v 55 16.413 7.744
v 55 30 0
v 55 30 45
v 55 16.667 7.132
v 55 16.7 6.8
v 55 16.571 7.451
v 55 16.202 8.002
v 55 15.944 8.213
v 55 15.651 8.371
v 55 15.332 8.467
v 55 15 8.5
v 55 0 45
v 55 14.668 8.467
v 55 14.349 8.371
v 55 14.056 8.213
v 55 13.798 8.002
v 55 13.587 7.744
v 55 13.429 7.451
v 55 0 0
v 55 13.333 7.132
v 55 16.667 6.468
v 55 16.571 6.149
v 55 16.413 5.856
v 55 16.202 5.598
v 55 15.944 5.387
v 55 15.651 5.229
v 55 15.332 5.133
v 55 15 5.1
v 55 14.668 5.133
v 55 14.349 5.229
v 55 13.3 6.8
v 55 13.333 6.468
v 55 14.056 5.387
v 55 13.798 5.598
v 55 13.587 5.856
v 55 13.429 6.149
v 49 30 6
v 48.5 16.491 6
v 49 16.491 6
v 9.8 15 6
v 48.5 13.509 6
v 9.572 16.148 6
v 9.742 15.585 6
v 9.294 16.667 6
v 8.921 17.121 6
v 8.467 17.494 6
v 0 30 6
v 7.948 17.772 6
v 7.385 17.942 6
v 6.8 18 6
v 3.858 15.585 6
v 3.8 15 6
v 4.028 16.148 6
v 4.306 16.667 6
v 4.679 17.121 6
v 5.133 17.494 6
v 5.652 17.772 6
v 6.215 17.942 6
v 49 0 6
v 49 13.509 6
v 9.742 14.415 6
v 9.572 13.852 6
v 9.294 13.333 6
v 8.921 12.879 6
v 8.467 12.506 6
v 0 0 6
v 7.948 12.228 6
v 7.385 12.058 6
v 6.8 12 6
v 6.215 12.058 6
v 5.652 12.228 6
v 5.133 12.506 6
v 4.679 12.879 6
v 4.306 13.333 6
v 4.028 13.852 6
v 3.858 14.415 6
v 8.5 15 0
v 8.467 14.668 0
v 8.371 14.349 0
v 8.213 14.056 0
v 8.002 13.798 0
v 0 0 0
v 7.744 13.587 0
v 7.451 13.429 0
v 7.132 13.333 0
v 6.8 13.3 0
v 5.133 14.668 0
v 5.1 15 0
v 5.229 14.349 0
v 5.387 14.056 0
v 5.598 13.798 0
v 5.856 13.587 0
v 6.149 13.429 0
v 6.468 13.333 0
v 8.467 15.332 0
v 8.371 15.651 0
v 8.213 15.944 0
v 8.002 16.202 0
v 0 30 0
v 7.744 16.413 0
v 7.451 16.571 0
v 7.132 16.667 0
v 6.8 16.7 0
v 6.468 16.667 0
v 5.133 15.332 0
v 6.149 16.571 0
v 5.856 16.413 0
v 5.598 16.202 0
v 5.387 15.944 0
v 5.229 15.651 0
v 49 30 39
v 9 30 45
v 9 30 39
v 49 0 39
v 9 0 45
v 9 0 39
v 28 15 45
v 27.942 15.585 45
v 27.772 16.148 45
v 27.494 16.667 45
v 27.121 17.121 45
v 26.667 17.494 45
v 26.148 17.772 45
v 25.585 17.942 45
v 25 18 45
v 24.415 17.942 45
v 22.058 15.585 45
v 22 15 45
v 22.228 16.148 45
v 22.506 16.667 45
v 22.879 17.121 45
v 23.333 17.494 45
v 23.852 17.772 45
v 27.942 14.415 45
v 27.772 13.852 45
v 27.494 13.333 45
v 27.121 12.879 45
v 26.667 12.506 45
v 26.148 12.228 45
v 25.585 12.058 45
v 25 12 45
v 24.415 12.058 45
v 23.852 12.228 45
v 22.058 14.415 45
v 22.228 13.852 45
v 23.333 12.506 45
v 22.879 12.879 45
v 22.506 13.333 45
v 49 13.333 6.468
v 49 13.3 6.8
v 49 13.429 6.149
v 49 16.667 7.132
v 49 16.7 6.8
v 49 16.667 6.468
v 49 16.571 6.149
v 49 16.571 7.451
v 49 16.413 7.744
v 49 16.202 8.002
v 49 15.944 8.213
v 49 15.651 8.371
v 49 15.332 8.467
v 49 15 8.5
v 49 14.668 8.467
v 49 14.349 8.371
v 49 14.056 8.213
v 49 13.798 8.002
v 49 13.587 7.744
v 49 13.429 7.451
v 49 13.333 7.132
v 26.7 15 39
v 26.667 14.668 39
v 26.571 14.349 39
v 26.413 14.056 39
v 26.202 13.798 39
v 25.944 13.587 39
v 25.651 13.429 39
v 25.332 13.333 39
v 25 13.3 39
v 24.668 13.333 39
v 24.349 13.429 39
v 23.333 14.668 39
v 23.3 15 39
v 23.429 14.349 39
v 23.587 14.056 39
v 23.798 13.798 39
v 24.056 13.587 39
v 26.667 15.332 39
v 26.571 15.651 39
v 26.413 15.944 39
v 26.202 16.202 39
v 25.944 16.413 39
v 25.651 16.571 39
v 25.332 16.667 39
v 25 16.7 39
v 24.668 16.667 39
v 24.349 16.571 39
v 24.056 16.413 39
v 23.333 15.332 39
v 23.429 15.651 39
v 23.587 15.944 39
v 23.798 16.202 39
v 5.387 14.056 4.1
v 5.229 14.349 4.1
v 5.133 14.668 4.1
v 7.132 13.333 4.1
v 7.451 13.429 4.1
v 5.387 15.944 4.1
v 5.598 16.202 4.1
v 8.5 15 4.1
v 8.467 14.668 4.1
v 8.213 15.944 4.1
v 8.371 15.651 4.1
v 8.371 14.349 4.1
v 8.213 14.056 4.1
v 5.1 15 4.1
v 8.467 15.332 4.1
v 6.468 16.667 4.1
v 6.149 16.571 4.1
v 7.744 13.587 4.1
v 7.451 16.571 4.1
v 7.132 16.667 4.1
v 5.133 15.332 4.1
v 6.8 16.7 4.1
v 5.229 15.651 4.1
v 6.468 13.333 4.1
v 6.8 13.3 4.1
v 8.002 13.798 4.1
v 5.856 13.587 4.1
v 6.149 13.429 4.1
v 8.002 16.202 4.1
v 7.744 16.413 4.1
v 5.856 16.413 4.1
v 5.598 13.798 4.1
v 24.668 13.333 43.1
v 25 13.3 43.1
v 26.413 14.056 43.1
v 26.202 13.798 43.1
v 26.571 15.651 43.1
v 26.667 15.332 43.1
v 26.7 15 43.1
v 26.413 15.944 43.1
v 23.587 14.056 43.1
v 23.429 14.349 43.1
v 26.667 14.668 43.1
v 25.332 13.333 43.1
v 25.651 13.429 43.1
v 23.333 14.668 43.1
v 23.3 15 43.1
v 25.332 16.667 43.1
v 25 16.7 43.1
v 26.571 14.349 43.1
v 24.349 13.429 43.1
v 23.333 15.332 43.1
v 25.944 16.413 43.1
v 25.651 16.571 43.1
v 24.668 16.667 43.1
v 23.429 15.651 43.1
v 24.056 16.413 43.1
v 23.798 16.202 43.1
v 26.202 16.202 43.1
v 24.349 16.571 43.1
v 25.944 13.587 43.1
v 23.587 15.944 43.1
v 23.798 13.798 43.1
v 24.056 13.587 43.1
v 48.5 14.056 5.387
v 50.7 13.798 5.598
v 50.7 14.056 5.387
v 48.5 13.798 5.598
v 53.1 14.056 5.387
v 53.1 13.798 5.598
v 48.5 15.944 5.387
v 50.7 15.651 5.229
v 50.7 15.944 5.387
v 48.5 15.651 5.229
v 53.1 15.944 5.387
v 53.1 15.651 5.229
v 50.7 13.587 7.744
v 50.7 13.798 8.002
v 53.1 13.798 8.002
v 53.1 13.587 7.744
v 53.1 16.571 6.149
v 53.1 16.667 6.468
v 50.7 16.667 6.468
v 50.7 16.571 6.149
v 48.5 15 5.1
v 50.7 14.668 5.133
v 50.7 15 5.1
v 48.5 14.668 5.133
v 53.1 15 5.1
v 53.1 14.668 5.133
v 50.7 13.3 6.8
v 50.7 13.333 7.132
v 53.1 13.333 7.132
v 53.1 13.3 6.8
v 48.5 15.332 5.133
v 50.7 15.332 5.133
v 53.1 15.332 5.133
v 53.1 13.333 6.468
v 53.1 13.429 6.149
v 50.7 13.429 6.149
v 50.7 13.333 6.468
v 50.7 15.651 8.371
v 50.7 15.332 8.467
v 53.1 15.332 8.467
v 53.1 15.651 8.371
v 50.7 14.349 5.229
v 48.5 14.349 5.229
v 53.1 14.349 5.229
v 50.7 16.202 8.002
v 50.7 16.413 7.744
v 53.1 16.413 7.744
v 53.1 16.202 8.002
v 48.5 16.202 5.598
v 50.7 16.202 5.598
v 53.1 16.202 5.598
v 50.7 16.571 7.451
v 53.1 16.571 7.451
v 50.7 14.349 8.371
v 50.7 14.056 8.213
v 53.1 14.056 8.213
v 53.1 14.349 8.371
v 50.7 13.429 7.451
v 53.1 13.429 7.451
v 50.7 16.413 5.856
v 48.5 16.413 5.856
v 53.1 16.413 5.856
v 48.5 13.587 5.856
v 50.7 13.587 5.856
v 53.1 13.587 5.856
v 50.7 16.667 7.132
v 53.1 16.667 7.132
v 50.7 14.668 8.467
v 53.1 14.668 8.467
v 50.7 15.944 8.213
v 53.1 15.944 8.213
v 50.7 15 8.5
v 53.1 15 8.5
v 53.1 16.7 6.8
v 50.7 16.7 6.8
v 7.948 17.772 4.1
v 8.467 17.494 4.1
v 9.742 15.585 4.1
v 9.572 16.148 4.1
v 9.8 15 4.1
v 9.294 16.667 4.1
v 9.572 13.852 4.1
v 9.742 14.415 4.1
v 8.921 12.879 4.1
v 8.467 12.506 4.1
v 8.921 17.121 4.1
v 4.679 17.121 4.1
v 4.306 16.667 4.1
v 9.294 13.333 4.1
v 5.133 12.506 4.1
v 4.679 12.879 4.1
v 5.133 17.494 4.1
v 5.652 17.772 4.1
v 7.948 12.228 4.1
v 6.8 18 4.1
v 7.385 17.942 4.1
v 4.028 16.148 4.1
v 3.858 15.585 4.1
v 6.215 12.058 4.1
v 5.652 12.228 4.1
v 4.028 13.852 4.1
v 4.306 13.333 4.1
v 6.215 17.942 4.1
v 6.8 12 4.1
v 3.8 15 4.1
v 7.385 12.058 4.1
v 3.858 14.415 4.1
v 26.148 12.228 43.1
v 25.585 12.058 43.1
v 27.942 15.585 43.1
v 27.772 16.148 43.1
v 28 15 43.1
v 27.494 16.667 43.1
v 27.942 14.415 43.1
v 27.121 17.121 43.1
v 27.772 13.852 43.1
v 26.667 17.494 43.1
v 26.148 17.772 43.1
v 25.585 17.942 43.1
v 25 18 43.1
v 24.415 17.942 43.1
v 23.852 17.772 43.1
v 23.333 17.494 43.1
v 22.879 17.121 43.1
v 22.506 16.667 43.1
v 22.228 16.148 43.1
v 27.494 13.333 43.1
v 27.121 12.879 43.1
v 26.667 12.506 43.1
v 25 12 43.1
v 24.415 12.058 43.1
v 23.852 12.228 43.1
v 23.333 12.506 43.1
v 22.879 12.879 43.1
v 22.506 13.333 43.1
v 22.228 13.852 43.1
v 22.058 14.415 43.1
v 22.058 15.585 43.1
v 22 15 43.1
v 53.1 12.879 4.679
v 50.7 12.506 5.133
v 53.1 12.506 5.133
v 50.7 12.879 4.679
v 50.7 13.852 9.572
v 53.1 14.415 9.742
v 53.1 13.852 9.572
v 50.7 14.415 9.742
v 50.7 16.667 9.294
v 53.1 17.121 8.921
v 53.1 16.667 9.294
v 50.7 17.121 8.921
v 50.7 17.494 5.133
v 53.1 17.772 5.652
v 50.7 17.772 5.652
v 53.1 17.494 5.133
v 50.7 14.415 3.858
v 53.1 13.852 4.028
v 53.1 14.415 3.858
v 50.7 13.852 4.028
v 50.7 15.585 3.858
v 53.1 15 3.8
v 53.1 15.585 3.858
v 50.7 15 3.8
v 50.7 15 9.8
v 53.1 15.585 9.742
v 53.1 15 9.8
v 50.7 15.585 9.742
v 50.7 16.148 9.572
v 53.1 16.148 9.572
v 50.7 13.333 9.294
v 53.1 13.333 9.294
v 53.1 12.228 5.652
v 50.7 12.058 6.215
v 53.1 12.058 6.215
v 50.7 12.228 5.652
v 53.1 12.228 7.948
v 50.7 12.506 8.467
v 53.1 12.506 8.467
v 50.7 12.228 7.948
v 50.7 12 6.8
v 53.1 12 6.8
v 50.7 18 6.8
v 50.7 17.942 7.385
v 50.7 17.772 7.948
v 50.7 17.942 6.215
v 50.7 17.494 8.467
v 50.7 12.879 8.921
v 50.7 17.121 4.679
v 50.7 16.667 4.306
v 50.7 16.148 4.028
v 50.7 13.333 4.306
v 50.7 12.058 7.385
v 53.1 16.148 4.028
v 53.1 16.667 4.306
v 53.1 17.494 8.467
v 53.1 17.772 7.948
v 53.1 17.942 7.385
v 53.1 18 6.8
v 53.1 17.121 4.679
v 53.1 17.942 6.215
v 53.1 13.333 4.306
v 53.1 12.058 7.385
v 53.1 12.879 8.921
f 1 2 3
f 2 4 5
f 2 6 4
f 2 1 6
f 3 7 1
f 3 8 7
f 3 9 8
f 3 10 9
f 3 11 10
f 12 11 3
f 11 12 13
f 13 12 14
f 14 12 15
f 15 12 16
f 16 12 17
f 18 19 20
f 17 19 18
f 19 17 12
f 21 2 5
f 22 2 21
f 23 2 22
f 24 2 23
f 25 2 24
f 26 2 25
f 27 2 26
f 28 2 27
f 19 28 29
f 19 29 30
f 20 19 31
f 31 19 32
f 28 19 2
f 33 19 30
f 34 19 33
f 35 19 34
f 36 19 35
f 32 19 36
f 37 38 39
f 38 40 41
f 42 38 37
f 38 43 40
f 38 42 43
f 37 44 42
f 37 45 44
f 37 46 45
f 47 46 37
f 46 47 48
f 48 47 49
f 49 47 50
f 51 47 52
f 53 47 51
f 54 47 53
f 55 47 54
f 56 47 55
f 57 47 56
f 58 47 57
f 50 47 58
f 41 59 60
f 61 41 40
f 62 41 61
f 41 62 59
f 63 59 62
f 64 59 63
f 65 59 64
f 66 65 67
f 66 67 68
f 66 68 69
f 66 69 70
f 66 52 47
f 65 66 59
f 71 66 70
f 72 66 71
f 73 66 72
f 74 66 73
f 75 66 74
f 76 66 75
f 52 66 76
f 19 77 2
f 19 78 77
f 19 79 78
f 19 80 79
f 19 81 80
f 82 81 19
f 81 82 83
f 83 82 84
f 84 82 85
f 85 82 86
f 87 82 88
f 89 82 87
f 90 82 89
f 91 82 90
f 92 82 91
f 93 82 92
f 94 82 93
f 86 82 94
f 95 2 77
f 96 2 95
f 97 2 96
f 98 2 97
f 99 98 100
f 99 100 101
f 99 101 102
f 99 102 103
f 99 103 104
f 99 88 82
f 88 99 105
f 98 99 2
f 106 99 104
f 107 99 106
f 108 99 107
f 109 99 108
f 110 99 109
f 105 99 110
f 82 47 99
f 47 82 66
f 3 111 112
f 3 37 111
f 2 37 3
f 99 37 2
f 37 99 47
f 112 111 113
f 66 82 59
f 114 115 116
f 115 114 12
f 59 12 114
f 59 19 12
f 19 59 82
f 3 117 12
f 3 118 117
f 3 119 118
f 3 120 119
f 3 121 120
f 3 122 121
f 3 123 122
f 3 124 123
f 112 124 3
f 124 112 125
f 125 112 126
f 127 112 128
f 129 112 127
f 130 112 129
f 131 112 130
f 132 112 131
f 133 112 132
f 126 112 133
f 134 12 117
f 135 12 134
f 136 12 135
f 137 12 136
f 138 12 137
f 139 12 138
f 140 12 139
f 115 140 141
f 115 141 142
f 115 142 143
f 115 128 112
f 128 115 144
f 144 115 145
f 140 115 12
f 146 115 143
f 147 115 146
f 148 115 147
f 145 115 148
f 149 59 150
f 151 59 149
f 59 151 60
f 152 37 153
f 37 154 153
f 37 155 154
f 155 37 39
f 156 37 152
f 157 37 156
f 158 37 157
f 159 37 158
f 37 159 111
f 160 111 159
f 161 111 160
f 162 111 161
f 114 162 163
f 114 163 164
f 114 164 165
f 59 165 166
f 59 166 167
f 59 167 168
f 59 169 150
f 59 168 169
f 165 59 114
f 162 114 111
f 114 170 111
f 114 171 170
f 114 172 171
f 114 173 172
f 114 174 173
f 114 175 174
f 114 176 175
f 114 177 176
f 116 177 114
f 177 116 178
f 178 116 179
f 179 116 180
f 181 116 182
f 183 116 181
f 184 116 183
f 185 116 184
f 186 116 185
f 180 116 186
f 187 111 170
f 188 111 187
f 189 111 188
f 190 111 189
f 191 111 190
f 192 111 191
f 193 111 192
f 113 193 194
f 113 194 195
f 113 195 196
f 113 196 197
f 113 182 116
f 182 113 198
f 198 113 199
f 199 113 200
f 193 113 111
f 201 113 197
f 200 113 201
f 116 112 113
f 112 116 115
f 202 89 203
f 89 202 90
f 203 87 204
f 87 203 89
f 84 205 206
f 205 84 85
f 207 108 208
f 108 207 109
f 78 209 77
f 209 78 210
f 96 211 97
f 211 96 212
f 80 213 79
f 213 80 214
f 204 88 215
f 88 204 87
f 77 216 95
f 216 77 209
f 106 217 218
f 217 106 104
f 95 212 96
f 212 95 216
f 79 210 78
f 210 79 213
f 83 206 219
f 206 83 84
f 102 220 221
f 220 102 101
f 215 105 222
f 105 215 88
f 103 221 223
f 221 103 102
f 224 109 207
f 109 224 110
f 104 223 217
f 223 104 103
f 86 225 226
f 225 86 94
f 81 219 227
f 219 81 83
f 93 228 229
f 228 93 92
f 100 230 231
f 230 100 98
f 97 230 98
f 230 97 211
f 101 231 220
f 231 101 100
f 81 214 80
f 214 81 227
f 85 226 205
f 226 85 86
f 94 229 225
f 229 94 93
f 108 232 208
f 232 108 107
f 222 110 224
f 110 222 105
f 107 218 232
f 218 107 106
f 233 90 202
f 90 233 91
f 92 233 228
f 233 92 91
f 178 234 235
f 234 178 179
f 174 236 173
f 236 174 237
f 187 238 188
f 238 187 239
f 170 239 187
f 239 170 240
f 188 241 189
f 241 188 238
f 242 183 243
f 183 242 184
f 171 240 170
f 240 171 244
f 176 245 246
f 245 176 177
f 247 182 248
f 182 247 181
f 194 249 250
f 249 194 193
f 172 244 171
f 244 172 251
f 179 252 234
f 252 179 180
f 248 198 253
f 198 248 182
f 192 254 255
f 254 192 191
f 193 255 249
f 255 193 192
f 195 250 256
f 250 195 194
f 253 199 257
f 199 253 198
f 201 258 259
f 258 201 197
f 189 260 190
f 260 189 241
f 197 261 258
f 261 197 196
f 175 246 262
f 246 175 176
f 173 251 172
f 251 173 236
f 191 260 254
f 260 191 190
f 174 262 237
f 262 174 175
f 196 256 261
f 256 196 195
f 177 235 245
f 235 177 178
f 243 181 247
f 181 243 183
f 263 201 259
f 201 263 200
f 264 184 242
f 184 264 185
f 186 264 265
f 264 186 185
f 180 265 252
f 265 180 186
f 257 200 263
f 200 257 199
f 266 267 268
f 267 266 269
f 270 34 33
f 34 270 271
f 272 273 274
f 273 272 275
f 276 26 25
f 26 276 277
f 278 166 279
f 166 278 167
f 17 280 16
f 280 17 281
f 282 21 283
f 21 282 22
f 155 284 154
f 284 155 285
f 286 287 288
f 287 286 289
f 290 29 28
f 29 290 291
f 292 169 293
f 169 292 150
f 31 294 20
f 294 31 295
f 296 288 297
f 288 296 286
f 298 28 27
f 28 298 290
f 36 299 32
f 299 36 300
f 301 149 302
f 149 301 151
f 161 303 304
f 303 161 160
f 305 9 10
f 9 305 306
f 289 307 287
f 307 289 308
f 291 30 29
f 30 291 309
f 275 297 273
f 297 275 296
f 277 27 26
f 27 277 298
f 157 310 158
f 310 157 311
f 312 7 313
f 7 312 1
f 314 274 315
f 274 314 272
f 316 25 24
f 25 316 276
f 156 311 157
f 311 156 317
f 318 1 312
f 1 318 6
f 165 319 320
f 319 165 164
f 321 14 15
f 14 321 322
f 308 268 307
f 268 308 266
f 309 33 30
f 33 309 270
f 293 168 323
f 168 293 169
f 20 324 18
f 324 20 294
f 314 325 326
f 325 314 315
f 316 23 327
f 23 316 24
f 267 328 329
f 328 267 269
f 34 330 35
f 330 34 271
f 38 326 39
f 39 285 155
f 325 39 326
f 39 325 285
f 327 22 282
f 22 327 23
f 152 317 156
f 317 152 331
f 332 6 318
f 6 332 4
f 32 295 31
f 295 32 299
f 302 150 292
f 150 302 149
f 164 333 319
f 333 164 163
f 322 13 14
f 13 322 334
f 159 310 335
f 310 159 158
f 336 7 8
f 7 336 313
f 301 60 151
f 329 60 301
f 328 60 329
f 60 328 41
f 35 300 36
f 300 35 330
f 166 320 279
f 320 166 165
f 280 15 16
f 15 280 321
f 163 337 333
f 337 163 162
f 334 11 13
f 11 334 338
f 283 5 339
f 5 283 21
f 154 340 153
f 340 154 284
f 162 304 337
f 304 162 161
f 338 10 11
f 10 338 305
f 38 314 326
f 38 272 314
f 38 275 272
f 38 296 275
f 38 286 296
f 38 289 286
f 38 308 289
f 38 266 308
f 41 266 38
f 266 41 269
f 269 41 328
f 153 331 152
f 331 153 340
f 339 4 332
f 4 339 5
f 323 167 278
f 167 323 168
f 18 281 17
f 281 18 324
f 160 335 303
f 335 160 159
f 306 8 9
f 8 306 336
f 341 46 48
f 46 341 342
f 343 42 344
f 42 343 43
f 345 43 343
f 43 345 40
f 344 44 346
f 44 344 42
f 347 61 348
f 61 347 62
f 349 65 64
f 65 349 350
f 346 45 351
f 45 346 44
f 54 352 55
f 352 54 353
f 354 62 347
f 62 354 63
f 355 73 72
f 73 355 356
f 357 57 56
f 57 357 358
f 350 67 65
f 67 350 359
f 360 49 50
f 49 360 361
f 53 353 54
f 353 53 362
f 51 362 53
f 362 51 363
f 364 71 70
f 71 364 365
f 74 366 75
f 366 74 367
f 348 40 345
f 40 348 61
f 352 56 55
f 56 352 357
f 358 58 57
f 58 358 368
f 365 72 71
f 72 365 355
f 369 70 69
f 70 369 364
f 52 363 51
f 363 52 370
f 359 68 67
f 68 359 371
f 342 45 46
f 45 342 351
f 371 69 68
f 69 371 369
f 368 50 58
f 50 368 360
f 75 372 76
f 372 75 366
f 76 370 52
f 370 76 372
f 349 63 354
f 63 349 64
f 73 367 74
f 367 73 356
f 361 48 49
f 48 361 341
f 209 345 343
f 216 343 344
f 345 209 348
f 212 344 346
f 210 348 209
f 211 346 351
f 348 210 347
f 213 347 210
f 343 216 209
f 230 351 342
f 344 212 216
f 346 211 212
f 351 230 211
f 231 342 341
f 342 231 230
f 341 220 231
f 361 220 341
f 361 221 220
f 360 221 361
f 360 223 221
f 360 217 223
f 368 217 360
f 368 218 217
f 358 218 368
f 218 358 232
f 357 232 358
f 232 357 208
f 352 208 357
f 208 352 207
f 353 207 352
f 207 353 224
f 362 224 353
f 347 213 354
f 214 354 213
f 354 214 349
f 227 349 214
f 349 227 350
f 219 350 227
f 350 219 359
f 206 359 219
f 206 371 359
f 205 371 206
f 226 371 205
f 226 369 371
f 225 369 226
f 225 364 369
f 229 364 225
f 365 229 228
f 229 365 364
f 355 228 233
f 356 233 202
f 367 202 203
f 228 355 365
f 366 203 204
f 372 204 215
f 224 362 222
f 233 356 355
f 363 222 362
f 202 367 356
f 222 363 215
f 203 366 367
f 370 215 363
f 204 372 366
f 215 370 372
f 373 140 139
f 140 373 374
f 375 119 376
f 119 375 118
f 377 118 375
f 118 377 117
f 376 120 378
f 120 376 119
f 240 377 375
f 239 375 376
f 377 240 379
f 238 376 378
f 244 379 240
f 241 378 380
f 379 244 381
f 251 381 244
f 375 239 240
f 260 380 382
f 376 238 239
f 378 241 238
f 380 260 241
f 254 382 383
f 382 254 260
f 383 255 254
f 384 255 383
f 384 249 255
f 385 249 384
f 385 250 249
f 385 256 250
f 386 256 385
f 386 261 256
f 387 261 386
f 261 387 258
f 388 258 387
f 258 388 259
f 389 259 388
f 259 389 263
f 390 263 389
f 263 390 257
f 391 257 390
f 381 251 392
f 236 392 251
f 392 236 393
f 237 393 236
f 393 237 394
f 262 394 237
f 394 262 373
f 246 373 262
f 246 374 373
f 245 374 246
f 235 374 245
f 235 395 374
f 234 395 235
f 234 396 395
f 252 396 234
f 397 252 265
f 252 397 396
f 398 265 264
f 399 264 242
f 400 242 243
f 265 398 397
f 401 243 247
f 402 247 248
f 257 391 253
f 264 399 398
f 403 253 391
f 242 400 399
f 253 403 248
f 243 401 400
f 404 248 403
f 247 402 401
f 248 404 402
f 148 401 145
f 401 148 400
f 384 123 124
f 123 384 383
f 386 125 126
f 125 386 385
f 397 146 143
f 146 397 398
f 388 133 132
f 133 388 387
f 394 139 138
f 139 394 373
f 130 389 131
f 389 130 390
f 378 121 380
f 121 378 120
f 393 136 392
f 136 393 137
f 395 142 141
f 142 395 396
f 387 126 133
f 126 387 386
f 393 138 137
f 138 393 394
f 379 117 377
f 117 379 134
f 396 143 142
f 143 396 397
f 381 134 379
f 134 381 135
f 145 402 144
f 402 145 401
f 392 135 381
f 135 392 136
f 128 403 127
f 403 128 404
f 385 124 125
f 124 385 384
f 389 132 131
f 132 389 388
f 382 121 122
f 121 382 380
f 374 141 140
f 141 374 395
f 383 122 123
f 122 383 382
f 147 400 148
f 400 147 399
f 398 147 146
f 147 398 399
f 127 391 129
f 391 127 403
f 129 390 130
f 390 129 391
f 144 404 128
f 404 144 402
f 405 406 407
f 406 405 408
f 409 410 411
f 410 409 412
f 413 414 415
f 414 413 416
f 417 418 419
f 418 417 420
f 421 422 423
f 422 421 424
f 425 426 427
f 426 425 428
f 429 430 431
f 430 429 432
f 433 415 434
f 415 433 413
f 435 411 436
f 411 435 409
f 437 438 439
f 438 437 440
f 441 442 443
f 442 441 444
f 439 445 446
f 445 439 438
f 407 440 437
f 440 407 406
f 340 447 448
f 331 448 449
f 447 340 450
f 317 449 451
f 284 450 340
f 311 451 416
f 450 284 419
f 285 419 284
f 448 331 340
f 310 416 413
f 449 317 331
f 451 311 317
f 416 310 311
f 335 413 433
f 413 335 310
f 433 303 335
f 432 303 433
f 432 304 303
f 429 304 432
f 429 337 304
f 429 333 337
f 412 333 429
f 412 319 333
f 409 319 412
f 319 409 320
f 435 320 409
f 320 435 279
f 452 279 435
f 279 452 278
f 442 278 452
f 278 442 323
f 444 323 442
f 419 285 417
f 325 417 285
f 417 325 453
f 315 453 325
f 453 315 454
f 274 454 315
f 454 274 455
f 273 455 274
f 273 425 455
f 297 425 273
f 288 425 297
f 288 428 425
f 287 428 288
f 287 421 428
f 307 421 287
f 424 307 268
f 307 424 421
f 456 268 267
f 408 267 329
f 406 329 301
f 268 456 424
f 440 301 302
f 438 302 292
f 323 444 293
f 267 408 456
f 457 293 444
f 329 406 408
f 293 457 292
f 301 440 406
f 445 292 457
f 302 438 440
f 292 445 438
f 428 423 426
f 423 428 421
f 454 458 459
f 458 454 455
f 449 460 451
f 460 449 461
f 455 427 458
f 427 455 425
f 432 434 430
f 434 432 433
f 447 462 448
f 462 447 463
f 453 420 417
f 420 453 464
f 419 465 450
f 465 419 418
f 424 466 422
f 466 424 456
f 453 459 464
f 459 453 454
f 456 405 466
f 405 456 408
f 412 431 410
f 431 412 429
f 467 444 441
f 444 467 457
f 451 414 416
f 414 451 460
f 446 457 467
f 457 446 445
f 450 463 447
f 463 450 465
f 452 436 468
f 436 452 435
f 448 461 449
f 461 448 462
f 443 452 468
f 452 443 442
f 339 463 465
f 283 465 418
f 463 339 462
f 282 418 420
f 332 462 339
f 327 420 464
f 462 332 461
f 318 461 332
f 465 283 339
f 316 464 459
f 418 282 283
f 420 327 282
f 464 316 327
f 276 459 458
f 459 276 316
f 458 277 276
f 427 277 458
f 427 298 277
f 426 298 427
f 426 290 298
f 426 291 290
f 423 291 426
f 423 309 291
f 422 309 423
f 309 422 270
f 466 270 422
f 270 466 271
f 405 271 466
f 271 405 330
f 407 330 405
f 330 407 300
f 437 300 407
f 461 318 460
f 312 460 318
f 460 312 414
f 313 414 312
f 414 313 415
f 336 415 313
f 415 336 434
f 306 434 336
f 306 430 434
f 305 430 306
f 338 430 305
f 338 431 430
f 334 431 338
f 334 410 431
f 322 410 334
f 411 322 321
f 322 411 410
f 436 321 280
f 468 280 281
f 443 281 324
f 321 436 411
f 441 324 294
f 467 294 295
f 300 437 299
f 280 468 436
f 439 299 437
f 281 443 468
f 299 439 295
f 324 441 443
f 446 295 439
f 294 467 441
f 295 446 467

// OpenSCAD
$fn = 32;

// ----------------------------------------------------------------------
// Z-bracket: 55 x 30 x 45 mm
// ----------------------------------------------------------------------

// --- parameters (mm) ---
foot_len = 55;            // lower foot length, X
top_len = 40;             // upper foot length, X
depth = 30;               // bracket width, Y
step_h = 45;              // overall rise, Z
plate_t = 6;              // plate thickness
hole_d = 3.4;             // clearance for M3
cb_d = 6;                 // counterbore diameter
cb_h = 1.9;               // counterbore depth

module hole_z(px, py, z0) {
  translate([px, py, z0 - 0.5]) cylinder(h = plate_t + 1, d = hole_d);
}
module hole_x(py, pz) {
  translate([-0.5, py, pz]) rotate([0, 90, 0]) cylinder(h = plate_t + 1, d = hole_d);
}
module cb_z(px, py, top_z) {
  translate([px, py, top_z - cb_h]) cylinder(h = cb_h + 0.5, d = cb_d);
}
module cb_x(py, pz) {
  translate([plate_t - cb_h, py, pz]) rotate([0, -90, 0]) cylinder(h = cb_h + 0.5, d = cb_d);
}

difference() {
  union() {
    cube([foot_len, depth, plate_t]);
    /* web, overlapping the lower foot */
    translate([foot_len - plate_t, 0, 0]) cube([plate_t, depth, step_h]);
    /* upper foot, sunk into the web */
    translate([foot_len - plate_t - top_len, 0, step_h - plate_t]) cube([top_len + plate_t, depth, plate_t]);
  }
  hole_z(6.8, 15, 0);
  translate([foot_len - plate_t - 24, 0, 0]) hole_z(0, 15, step_h - plate_t);
  translate([foot_len - plate_t, 0, 0]) hole_x(15, 6.8);
  cb_z(6.8, 15, plate_t);
  translate([foot_len - plate_t - 24, 0, 0]) cb_z(0, 15, step_h);
  translate([foot_len - plate_t, 0, 0]) cb_x(15, 6.8);
}
